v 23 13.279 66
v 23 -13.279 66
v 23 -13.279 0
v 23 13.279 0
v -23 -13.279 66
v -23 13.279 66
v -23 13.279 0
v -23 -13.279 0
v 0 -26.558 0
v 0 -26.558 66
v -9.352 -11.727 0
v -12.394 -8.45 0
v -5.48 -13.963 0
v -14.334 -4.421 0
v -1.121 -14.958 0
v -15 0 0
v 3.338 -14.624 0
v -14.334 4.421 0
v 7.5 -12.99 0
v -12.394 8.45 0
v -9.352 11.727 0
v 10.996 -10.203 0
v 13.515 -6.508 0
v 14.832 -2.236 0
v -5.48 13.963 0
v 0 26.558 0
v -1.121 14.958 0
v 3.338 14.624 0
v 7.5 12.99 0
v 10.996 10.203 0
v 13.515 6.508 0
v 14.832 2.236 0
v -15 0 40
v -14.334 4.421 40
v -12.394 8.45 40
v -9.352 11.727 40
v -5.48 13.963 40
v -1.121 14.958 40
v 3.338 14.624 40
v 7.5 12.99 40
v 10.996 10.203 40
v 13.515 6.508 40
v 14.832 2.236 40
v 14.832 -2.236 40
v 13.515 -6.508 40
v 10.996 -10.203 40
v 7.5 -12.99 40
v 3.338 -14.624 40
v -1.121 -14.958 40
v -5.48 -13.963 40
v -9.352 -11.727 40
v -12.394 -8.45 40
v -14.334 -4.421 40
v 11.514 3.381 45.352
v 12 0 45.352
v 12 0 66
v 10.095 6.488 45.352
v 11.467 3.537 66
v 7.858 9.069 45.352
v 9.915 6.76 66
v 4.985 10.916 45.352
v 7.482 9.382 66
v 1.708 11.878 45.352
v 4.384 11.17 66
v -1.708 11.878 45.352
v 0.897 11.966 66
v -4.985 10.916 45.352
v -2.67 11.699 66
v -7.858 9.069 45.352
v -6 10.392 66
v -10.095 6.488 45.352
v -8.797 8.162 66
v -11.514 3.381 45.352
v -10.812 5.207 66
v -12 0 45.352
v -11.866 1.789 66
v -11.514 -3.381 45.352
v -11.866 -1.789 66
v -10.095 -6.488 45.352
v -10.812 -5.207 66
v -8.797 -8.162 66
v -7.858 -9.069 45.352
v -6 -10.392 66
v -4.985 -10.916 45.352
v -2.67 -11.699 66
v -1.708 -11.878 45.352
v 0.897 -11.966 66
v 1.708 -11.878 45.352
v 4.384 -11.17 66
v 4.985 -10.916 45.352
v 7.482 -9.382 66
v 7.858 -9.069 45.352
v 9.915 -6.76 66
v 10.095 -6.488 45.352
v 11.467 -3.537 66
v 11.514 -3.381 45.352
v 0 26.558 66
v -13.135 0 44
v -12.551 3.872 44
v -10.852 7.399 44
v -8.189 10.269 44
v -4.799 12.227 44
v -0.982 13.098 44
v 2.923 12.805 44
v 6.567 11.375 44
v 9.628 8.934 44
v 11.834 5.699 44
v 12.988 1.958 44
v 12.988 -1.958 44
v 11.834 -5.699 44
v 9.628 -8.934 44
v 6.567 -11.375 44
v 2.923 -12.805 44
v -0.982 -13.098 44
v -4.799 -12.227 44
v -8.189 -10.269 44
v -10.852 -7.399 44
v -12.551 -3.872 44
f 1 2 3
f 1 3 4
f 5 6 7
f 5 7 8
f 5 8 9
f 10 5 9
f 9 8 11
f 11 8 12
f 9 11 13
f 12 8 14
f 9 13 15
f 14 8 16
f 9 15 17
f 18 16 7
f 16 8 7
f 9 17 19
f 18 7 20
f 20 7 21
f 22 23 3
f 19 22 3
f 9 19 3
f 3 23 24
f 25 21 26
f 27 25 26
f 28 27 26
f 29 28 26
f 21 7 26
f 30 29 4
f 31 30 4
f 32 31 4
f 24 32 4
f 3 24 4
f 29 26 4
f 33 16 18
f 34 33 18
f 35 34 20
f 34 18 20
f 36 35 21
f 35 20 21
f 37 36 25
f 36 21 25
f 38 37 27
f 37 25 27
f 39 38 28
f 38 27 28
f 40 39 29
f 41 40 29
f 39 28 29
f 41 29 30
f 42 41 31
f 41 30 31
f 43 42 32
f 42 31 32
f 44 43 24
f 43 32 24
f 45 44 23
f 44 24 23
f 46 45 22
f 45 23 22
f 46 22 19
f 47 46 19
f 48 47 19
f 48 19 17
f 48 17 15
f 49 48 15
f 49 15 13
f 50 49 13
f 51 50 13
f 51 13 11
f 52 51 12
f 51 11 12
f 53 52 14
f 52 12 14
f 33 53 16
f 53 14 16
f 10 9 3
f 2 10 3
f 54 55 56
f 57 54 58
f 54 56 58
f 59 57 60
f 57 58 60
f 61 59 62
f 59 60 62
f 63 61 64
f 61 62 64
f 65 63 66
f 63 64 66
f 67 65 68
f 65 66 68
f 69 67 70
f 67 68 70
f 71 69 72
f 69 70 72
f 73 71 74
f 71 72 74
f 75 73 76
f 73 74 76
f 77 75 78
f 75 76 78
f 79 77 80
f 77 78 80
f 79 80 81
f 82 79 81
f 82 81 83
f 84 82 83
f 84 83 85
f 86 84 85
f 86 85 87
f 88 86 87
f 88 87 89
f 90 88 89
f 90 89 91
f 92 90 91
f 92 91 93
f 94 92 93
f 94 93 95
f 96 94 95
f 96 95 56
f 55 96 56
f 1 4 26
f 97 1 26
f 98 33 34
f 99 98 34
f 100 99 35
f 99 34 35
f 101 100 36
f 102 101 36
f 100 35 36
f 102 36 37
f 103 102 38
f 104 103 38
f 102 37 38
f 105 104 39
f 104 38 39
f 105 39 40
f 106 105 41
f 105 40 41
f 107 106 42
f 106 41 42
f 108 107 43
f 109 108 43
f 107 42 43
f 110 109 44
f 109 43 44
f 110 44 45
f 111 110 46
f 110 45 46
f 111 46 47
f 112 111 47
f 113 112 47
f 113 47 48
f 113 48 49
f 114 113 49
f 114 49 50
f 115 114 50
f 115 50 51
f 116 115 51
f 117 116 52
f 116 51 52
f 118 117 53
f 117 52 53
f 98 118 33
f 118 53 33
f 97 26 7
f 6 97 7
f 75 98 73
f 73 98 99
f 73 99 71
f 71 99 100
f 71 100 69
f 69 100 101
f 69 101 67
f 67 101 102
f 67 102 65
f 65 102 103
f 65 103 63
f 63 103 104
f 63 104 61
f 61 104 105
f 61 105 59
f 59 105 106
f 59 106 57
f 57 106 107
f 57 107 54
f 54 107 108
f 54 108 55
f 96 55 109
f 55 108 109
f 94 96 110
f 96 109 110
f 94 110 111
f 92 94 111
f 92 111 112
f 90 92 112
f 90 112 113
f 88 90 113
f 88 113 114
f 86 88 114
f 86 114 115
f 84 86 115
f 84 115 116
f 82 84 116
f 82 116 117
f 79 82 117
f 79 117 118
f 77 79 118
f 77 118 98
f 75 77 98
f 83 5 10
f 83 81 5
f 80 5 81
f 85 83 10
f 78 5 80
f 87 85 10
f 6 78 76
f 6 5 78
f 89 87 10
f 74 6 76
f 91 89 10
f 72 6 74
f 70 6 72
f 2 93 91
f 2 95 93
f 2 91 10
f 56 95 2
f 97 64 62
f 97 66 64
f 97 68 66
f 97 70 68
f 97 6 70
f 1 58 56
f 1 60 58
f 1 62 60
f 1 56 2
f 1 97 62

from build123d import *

# Parameters (mm, degrees)
EXTRUDE_1_DEPTH     = 66
SKETCH_12_R         = 15
CUT_EXTRUDE_3_DEPTH = 40
SKETCH_16_R         = 15
CUT_EXTRUDE_6_DEPTH = 4
CUT_EXTRUDE_6_DRAFT = -25
SKETCH_17_R         = 13.134769367
CUT_EXTRUDE_7_DEPTH = 2
CUT_EXTRUDE_7_DRAFT = -40
SKETCH_18_R         = 12
CUT_EXTRUDE_8_DEPTH = 22


with BuildPart() as part:
    # 草图2 → 拉伸1 (new body)
    with BuildSketch(Plane.XY):
        Polygon((0, 26.558112383), (-23, 13.279056191), (-23, -13.279056191), (0, -26.558112383), (23, -13.279056191), (23, 13.279056191), align=None)
    extrude(amount=EXTRUDE_1_DEPTH)

    # 草图12 → 拉伸3 (cut)
    with BuildSketch(Plane(origin=(0, 0, 0), x_dir=(-1, 0, 0), z_dir=(0, 0, -1))):
        Circle(SKETCH_12_R)
    extrude(amount=-CUT_EXTRUDE_3_DEPTH, mode=Mode.SUBTRACT)


with BuildPart() as cut_extrude_6_tool:
    # 草图16 → 拉伸6 (with draft: the straight prism first)
    with BuildSketch(Plane(origin=(0, 0, 40), x_dir=(-1, 0, 0), z_dir=(0, 0, -1))):
        Circle(SKETCH_16_R)
    extrude(amount=-CUT_EXTRUDE_6_DEPTH)
    # 拉伸6: the draft: its side faces are tilted about the plane it starts from
    cut_extrude_6_sides = [cut_extrude_6_tool.faces().sort_by_distance(p)[0] for p in [
        (15, 0, 42),
    ]]
    draft(cut_extrude_6_sides, Plane(origin=(0, 0, 40), x_dir=(-1, 0, 0), z_dir=(0, 0, -1)), CUT_EXTRUDE_6_DRAFT)


with BuildPart() as part_1:
    add(part.part)

    # 拉伸6: cut by cut_extrude_6_tool
    add(cut_extrude_6_tool.part, mode=Mode.SUBTRACT)


with BuildPart() as cut_extrude_7_tool:
    # 草图17 → 拉伸7 (with draft: the straight prism first)
    with BuildSketch(Plane(origin=(0, 0, 44), x_dir=(-1, 0, 0), z_dir=(0, 0, -1))):
        Circle(SKETCH_17_R)
    extrude(amount=-CUT_EXTRUDE_7_DEPTH)
    # 拉伸7: the draft: its side faces are tilted about the plane it starts from
    cut_extrude_7_sides = [cut_extrude_7_tool.faces().sort_by_distance(p)[0] for p in [
        (13.134769367, 0, 45),
    ]]
    draft(cut_extrude_7_sides, Plane(origin=(0, 0, 44), x_dir=(-1, 0, 0), z_dir=(0, 0, -1)), CUT_EXTRUDE_7_DRAFT)


with BuildPart() as part_2:
    add(part_1.part)

    # 拉伸7: cut by cut_extrude_7_tool
    add(cut_extrude_7_tool.part, mode=Mode.SUBTRACT)

    # 草图18 → 拉伸8 (cut)
    with BuildSketch(Plane.XY.offset(66)):
        Circle(SKETCH_18_R)
    extrude(amount=-CUT_EXTRUDE_8_DEPTH, mode=Mode.SUBTRACT)


solid = part_2.part
